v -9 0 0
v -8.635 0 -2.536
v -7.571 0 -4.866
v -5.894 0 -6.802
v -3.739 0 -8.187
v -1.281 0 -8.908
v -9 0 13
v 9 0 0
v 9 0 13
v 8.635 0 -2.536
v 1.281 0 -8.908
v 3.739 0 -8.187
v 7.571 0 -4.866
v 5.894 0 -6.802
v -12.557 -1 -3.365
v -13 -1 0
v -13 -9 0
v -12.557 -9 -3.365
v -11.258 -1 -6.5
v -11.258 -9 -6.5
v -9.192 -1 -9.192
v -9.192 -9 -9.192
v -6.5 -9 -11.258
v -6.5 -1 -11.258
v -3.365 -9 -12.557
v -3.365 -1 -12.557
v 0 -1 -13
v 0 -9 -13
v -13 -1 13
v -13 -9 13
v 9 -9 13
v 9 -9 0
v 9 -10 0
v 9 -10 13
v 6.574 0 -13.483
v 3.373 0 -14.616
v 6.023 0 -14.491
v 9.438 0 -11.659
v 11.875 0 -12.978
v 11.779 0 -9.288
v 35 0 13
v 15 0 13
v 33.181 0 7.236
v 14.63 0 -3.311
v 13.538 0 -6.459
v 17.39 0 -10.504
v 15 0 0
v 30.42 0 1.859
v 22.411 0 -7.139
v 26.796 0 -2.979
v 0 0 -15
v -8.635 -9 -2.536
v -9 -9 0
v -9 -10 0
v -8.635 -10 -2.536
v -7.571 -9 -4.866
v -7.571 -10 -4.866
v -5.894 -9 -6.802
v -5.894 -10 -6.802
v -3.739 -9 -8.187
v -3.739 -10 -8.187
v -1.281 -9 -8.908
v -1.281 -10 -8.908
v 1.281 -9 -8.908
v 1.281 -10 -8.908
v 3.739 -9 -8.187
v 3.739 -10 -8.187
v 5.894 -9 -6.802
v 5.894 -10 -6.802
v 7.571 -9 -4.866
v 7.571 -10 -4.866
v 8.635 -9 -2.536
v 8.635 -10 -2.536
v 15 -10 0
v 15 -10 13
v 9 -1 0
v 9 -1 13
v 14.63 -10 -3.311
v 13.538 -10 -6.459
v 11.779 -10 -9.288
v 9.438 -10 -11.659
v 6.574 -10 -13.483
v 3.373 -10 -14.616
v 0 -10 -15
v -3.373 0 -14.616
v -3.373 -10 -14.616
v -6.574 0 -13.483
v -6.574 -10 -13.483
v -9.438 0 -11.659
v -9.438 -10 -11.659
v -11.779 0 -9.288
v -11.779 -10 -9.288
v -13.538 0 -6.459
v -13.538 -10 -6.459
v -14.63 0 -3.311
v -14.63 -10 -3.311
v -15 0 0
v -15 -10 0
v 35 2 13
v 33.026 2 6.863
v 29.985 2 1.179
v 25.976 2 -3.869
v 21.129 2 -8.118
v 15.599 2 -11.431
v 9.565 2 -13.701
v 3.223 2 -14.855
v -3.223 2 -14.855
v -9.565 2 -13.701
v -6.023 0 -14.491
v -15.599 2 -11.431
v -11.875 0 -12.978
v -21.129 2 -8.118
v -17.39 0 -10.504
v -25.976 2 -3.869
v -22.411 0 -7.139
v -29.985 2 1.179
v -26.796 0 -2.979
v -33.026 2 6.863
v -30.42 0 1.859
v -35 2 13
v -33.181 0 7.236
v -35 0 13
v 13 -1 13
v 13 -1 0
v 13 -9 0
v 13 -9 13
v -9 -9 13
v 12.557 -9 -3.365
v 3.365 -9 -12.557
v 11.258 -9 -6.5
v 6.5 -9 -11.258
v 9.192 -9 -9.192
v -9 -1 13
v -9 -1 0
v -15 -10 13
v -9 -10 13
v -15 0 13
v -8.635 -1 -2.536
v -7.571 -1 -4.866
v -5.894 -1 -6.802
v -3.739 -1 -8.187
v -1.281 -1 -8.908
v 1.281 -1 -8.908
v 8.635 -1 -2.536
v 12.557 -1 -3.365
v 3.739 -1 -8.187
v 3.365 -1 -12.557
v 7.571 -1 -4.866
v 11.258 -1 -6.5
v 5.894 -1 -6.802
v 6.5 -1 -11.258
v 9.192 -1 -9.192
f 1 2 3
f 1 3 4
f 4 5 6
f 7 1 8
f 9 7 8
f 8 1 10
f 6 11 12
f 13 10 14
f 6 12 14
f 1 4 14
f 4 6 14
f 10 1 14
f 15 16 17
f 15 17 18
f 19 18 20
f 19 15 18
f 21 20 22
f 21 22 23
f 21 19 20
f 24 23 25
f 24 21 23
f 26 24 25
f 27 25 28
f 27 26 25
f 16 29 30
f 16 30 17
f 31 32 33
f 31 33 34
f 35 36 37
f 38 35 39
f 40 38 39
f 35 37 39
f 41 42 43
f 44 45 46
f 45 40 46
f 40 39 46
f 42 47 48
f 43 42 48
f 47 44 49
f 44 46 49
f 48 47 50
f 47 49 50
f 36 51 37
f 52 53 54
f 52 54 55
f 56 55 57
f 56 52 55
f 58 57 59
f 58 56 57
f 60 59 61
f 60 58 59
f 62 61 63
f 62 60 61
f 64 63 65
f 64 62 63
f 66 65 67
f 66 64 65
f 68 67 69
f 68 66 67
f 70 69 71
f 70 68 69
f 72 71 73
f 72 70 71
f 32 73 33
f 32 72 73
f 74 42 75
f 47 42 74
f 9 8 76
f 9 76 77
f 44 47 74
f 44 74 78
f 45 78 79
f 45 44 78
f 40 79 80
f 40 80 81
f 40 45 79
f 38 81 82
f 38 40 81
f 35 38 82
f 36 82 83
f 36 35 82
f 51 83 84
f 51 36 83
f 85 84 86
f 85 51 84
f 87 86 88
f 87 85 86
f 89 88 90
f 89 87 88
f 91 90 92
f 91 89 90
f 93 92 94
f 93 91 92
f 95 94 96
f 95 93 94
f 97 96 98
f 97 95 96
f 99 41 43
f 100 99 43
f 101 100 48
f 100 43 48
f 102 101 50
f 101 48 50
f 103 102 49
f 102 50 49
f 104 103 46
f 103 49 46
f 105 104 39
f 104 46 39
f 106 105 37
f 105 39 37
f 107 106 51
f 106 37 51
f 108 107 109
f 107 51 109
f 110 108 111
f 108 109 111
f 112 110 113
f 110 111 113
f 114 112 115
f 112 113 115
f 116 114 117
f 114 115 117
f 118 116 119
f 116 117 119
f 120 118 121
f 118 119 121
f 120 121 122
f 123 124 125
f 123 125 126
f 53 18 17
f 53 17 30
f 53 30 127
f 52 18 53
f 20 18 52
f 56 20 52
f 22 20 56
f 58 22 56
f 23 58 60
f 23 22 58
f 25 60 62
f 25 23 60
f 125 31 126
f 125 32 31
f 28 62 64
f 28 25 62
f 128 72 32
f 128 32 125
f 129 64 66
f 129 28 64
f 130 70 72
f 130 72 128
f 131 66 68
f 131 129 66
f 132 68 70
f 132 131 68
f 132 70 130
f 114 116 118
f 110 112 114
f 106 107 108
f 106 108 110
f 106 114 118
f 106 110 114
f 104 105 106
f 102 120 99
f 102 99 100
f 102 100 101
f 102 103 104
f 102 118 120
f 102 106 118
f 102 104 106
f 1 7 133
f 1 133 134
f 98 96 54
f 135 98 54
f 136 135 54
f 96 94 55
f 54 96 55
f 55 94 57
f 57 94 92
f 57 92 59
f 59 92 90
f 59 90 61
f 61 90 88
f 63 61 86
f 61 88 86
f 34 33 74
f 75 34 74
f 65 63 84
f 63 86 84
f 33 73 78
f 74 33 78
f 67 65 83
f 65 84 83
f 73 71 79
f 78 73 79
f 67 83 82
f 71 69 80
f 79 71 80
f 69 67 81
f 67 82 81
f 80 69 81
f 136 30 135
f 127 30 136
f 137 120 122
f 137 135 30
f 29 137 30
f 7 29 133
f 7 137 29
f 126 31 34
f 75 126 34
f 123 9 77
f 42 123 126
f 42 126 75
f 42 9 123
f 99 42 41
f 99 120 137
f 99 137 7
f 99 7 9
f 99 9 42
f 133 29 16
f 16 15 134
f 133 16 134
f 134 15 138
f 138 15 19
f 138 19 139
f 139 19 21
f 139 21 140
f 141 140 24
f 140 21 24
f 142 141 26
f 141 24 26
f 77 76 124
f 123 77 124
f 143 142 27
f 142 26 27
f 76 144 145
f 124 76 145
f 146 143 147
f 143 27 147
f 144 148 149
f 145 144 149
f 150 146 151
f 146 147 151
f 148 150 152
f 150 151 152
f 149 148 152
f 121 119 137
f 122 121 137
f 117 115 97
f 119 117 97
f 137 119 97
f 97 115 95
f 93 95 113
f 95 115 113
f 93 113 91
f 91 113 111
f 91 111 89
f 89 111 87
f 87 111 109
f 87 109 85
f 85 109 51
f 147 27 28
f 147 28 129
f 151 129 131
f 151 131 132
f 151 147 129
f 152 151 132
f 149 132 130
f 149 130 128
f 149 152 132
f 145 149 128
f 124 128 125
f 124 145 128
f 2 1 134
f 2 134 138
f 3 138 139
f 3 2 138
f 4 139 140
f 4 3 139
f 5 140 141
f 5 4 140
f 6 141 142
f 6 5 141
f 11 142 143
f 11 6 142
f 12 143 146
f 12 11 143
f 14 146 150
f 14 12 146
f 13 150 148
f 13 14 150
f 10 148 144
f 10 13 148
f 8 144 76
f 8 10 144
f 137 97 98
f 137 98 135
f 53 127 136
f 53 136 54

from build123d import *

# Parameters (mm, degrees)
BOSS_EXTRUDE1_DEPTH = 2
BOSS_EXTRUDE3_DEPTH = 9
BOSS_EXTRUDE4_DEPTH = 1
BOSS_EXTRUDE5_START = -9
BOSS_EXTRUDE5_DEPTH = 1


with BuildPart() as part:
    # Sketch1 → Boss-Extrude1 (new body)
    with BuildSketch(Plane(origin=(0, 0, 0), x_dir=(1, 0, 0), z_dir=(0, 1, 0))):
        with BuildLine():
            Line((-35, -13), (35, -13))
            ThreePointArc((35, -13), (0, 15), (-35, -13))
        make_face()
    extrude(amount=BOSS_EXTRUDE1_DEPTH)

    # Sketch1<5> → Boss-Extrude3 (add)
    with BuildSketch(Plane(origin=(0, 0, 0), x_dir=(1, 0, 0), z_dir=(0, 1, 0))):
        with BuildLine():
            ThreePointArc((9.437961603, 11.658682635), (4.766399393, 12.662994302), (6.3e-08, 13))
            ThreePointArc((6.3e-08, 13), (9.192388178, 9.192388133), (13, 0))
            Line((13, 0), (13, -13))
            Line((13, -13), (15, -13))
            Line((15, -13), (15, 0))
            ThreePointArc((15, 0), (13.538268428, 6.458737336), (9.437961603, 11.658682635))
        make_face()
        with BuildLine():
            ThreePointArc((-9.437961603, 11.658682635), (-4.76639933, 12.662994311), (6.3e-08, 13))
            ThreePointArc((6.3e-08, 13), (4.766399393, 12.662994302), (9.437961603, 11.658682635))
            ThreePointArc((9.437961603, 11.658682635), (5.005984494, 14.140018361), (1.09e-07, 15))
            ThreePointArc((1.09e-07, 15), (-5.005984391, 14.140018397), (-9.437961603, 11.658682635))
        make_face()
        with BuildLine():
            Line((-13, -13), (-13, 0))
            ThreePointArc((-13, 0), (-9.192388133, 9.192388178), (6.3e-08, 13))
            ThreePointArc((6.3e-08, 13), (-4.76639933, 12.662994311), (-9.437961603, 11.658682635))
            ThreePointArc((-9.437961603, 11.658682635), (-13.538268428, 6.458737336), (-15, 0))
            Line((-15, 0), (-15, -13))
            Line((-15, -13), (-13, -13))
        make_face()
    extrude(amount=-BOSS_EXTRUDE3_DEPTH)

    # Sketch1<6> → Boss-Extrude4 (add)
    with BuildSketch(Plane(origin=(0, 0, 0), x_dir=(1, 0, 0), z_dir=(0, 1, 0))):
        with BuildLine():
            ThreePointArc((6.3e-08, 13), (-9.192388133, 9.192388178), (-13, 0))
            Line((-13, 0), (-13, -13))
            Line((-13, -13), (-9, -13))
            Line((-9, -13), (-9, 0))
            ThreePointArc((-9, 0), (0, 9), (9, 0))
            Line((9, 0), (9, -13))
            Line((9, -13), (13, -13))
            Line((13, -13), (13, 0))
            ThreePointArc((13, 0), (9.192388178, 9.192388133), (6.3e-08, 13))
        make_face()
    extrude(amount=-BOSS_EXTRUDE4_DEPTH)

    # Sketch1<7> → Boss-Extrude5 (add)
    with BuildSketch(Plane(origin=(0, 0, 0), x_dir=(1, 0, 0), z_dir=(0, 1, 0)).offset(BOSS_EXTRUDE5_START)):
        with BuildLine():
            Line((-13, -13), (-13, 0))
            ThreePointArc((-13, 0), (-9.192388133, 9.192388178), (6.3e-08, 13))
            ThreePointArc((6.3e-08, 13), (-4.76639933, 12.662994311), (-9.437961603, 11.658682635))
            ThreePointArc((-9.437961603, 11.658682635), (-13.538268428, 6.458737336), (-15, 0))
            Line((-15, 0), (-15, -13))
            Line((-15, -13), (-13, -13))
        make_face()
        with BuildLine():
            ThreePointArc((-9.437961603, 11.658682635), (-4.76639933, 12.662994311), (6.3e-08, 13))
            ThreePointArc((6.3e-08, 13), (4.766399393, 12.662994302), (9.437961603, 11.658682635))
            ThreePointArc((9.437961603, 11.658682635), (5.005984494, 14.140018361), (1.09e-07, 15))
            ThreePointArc((1.09e-07, 15), (-5.005984391, 14.140018397), (-9.437961603, 11.658682635))
        make_face()
        with BuildLine():
            ThreePointArc((9.437961603, 11.658682635), (4.766399393, 12.662994302), (6.3e-08, 13))
            ThreePointArc((6.3e-08, 13), (9.192388178, 9.192388133), (13, 0))
            Line((13, 0), (13, -13))
            Line((13, -13), (15, -13))
            Line((15, -13), (15, 0))
            ThreePointArc((15, 0), (13.538268428, 6.458737336), (9.437961603, 11.658682635))
        make_face()
        with BuildLine():
            ThreePointArc((6.3e-08, 13), (-9.192388133, 9.192388178), (-13, 0))
            Line((-13, 0), (-13, -13))
            Line((-13, -13), (-9, -13))
            Line((-9, -13), (-9, 0))
            ThreePointArc((-9, 0), (0, 9), (9, 0))
            Line((9, 0), (9, -13))
            Line((9, -13), (13, -13))
            Line((13, -13), (13, 0))
            ThreePointArc((13, 0), (9.192388178, 9.192388133), (6.3e-08, 13))
        make_face()
    extrude(amount=-BOSS_EXTRUDE5_DEPTH)


solid = part.part
